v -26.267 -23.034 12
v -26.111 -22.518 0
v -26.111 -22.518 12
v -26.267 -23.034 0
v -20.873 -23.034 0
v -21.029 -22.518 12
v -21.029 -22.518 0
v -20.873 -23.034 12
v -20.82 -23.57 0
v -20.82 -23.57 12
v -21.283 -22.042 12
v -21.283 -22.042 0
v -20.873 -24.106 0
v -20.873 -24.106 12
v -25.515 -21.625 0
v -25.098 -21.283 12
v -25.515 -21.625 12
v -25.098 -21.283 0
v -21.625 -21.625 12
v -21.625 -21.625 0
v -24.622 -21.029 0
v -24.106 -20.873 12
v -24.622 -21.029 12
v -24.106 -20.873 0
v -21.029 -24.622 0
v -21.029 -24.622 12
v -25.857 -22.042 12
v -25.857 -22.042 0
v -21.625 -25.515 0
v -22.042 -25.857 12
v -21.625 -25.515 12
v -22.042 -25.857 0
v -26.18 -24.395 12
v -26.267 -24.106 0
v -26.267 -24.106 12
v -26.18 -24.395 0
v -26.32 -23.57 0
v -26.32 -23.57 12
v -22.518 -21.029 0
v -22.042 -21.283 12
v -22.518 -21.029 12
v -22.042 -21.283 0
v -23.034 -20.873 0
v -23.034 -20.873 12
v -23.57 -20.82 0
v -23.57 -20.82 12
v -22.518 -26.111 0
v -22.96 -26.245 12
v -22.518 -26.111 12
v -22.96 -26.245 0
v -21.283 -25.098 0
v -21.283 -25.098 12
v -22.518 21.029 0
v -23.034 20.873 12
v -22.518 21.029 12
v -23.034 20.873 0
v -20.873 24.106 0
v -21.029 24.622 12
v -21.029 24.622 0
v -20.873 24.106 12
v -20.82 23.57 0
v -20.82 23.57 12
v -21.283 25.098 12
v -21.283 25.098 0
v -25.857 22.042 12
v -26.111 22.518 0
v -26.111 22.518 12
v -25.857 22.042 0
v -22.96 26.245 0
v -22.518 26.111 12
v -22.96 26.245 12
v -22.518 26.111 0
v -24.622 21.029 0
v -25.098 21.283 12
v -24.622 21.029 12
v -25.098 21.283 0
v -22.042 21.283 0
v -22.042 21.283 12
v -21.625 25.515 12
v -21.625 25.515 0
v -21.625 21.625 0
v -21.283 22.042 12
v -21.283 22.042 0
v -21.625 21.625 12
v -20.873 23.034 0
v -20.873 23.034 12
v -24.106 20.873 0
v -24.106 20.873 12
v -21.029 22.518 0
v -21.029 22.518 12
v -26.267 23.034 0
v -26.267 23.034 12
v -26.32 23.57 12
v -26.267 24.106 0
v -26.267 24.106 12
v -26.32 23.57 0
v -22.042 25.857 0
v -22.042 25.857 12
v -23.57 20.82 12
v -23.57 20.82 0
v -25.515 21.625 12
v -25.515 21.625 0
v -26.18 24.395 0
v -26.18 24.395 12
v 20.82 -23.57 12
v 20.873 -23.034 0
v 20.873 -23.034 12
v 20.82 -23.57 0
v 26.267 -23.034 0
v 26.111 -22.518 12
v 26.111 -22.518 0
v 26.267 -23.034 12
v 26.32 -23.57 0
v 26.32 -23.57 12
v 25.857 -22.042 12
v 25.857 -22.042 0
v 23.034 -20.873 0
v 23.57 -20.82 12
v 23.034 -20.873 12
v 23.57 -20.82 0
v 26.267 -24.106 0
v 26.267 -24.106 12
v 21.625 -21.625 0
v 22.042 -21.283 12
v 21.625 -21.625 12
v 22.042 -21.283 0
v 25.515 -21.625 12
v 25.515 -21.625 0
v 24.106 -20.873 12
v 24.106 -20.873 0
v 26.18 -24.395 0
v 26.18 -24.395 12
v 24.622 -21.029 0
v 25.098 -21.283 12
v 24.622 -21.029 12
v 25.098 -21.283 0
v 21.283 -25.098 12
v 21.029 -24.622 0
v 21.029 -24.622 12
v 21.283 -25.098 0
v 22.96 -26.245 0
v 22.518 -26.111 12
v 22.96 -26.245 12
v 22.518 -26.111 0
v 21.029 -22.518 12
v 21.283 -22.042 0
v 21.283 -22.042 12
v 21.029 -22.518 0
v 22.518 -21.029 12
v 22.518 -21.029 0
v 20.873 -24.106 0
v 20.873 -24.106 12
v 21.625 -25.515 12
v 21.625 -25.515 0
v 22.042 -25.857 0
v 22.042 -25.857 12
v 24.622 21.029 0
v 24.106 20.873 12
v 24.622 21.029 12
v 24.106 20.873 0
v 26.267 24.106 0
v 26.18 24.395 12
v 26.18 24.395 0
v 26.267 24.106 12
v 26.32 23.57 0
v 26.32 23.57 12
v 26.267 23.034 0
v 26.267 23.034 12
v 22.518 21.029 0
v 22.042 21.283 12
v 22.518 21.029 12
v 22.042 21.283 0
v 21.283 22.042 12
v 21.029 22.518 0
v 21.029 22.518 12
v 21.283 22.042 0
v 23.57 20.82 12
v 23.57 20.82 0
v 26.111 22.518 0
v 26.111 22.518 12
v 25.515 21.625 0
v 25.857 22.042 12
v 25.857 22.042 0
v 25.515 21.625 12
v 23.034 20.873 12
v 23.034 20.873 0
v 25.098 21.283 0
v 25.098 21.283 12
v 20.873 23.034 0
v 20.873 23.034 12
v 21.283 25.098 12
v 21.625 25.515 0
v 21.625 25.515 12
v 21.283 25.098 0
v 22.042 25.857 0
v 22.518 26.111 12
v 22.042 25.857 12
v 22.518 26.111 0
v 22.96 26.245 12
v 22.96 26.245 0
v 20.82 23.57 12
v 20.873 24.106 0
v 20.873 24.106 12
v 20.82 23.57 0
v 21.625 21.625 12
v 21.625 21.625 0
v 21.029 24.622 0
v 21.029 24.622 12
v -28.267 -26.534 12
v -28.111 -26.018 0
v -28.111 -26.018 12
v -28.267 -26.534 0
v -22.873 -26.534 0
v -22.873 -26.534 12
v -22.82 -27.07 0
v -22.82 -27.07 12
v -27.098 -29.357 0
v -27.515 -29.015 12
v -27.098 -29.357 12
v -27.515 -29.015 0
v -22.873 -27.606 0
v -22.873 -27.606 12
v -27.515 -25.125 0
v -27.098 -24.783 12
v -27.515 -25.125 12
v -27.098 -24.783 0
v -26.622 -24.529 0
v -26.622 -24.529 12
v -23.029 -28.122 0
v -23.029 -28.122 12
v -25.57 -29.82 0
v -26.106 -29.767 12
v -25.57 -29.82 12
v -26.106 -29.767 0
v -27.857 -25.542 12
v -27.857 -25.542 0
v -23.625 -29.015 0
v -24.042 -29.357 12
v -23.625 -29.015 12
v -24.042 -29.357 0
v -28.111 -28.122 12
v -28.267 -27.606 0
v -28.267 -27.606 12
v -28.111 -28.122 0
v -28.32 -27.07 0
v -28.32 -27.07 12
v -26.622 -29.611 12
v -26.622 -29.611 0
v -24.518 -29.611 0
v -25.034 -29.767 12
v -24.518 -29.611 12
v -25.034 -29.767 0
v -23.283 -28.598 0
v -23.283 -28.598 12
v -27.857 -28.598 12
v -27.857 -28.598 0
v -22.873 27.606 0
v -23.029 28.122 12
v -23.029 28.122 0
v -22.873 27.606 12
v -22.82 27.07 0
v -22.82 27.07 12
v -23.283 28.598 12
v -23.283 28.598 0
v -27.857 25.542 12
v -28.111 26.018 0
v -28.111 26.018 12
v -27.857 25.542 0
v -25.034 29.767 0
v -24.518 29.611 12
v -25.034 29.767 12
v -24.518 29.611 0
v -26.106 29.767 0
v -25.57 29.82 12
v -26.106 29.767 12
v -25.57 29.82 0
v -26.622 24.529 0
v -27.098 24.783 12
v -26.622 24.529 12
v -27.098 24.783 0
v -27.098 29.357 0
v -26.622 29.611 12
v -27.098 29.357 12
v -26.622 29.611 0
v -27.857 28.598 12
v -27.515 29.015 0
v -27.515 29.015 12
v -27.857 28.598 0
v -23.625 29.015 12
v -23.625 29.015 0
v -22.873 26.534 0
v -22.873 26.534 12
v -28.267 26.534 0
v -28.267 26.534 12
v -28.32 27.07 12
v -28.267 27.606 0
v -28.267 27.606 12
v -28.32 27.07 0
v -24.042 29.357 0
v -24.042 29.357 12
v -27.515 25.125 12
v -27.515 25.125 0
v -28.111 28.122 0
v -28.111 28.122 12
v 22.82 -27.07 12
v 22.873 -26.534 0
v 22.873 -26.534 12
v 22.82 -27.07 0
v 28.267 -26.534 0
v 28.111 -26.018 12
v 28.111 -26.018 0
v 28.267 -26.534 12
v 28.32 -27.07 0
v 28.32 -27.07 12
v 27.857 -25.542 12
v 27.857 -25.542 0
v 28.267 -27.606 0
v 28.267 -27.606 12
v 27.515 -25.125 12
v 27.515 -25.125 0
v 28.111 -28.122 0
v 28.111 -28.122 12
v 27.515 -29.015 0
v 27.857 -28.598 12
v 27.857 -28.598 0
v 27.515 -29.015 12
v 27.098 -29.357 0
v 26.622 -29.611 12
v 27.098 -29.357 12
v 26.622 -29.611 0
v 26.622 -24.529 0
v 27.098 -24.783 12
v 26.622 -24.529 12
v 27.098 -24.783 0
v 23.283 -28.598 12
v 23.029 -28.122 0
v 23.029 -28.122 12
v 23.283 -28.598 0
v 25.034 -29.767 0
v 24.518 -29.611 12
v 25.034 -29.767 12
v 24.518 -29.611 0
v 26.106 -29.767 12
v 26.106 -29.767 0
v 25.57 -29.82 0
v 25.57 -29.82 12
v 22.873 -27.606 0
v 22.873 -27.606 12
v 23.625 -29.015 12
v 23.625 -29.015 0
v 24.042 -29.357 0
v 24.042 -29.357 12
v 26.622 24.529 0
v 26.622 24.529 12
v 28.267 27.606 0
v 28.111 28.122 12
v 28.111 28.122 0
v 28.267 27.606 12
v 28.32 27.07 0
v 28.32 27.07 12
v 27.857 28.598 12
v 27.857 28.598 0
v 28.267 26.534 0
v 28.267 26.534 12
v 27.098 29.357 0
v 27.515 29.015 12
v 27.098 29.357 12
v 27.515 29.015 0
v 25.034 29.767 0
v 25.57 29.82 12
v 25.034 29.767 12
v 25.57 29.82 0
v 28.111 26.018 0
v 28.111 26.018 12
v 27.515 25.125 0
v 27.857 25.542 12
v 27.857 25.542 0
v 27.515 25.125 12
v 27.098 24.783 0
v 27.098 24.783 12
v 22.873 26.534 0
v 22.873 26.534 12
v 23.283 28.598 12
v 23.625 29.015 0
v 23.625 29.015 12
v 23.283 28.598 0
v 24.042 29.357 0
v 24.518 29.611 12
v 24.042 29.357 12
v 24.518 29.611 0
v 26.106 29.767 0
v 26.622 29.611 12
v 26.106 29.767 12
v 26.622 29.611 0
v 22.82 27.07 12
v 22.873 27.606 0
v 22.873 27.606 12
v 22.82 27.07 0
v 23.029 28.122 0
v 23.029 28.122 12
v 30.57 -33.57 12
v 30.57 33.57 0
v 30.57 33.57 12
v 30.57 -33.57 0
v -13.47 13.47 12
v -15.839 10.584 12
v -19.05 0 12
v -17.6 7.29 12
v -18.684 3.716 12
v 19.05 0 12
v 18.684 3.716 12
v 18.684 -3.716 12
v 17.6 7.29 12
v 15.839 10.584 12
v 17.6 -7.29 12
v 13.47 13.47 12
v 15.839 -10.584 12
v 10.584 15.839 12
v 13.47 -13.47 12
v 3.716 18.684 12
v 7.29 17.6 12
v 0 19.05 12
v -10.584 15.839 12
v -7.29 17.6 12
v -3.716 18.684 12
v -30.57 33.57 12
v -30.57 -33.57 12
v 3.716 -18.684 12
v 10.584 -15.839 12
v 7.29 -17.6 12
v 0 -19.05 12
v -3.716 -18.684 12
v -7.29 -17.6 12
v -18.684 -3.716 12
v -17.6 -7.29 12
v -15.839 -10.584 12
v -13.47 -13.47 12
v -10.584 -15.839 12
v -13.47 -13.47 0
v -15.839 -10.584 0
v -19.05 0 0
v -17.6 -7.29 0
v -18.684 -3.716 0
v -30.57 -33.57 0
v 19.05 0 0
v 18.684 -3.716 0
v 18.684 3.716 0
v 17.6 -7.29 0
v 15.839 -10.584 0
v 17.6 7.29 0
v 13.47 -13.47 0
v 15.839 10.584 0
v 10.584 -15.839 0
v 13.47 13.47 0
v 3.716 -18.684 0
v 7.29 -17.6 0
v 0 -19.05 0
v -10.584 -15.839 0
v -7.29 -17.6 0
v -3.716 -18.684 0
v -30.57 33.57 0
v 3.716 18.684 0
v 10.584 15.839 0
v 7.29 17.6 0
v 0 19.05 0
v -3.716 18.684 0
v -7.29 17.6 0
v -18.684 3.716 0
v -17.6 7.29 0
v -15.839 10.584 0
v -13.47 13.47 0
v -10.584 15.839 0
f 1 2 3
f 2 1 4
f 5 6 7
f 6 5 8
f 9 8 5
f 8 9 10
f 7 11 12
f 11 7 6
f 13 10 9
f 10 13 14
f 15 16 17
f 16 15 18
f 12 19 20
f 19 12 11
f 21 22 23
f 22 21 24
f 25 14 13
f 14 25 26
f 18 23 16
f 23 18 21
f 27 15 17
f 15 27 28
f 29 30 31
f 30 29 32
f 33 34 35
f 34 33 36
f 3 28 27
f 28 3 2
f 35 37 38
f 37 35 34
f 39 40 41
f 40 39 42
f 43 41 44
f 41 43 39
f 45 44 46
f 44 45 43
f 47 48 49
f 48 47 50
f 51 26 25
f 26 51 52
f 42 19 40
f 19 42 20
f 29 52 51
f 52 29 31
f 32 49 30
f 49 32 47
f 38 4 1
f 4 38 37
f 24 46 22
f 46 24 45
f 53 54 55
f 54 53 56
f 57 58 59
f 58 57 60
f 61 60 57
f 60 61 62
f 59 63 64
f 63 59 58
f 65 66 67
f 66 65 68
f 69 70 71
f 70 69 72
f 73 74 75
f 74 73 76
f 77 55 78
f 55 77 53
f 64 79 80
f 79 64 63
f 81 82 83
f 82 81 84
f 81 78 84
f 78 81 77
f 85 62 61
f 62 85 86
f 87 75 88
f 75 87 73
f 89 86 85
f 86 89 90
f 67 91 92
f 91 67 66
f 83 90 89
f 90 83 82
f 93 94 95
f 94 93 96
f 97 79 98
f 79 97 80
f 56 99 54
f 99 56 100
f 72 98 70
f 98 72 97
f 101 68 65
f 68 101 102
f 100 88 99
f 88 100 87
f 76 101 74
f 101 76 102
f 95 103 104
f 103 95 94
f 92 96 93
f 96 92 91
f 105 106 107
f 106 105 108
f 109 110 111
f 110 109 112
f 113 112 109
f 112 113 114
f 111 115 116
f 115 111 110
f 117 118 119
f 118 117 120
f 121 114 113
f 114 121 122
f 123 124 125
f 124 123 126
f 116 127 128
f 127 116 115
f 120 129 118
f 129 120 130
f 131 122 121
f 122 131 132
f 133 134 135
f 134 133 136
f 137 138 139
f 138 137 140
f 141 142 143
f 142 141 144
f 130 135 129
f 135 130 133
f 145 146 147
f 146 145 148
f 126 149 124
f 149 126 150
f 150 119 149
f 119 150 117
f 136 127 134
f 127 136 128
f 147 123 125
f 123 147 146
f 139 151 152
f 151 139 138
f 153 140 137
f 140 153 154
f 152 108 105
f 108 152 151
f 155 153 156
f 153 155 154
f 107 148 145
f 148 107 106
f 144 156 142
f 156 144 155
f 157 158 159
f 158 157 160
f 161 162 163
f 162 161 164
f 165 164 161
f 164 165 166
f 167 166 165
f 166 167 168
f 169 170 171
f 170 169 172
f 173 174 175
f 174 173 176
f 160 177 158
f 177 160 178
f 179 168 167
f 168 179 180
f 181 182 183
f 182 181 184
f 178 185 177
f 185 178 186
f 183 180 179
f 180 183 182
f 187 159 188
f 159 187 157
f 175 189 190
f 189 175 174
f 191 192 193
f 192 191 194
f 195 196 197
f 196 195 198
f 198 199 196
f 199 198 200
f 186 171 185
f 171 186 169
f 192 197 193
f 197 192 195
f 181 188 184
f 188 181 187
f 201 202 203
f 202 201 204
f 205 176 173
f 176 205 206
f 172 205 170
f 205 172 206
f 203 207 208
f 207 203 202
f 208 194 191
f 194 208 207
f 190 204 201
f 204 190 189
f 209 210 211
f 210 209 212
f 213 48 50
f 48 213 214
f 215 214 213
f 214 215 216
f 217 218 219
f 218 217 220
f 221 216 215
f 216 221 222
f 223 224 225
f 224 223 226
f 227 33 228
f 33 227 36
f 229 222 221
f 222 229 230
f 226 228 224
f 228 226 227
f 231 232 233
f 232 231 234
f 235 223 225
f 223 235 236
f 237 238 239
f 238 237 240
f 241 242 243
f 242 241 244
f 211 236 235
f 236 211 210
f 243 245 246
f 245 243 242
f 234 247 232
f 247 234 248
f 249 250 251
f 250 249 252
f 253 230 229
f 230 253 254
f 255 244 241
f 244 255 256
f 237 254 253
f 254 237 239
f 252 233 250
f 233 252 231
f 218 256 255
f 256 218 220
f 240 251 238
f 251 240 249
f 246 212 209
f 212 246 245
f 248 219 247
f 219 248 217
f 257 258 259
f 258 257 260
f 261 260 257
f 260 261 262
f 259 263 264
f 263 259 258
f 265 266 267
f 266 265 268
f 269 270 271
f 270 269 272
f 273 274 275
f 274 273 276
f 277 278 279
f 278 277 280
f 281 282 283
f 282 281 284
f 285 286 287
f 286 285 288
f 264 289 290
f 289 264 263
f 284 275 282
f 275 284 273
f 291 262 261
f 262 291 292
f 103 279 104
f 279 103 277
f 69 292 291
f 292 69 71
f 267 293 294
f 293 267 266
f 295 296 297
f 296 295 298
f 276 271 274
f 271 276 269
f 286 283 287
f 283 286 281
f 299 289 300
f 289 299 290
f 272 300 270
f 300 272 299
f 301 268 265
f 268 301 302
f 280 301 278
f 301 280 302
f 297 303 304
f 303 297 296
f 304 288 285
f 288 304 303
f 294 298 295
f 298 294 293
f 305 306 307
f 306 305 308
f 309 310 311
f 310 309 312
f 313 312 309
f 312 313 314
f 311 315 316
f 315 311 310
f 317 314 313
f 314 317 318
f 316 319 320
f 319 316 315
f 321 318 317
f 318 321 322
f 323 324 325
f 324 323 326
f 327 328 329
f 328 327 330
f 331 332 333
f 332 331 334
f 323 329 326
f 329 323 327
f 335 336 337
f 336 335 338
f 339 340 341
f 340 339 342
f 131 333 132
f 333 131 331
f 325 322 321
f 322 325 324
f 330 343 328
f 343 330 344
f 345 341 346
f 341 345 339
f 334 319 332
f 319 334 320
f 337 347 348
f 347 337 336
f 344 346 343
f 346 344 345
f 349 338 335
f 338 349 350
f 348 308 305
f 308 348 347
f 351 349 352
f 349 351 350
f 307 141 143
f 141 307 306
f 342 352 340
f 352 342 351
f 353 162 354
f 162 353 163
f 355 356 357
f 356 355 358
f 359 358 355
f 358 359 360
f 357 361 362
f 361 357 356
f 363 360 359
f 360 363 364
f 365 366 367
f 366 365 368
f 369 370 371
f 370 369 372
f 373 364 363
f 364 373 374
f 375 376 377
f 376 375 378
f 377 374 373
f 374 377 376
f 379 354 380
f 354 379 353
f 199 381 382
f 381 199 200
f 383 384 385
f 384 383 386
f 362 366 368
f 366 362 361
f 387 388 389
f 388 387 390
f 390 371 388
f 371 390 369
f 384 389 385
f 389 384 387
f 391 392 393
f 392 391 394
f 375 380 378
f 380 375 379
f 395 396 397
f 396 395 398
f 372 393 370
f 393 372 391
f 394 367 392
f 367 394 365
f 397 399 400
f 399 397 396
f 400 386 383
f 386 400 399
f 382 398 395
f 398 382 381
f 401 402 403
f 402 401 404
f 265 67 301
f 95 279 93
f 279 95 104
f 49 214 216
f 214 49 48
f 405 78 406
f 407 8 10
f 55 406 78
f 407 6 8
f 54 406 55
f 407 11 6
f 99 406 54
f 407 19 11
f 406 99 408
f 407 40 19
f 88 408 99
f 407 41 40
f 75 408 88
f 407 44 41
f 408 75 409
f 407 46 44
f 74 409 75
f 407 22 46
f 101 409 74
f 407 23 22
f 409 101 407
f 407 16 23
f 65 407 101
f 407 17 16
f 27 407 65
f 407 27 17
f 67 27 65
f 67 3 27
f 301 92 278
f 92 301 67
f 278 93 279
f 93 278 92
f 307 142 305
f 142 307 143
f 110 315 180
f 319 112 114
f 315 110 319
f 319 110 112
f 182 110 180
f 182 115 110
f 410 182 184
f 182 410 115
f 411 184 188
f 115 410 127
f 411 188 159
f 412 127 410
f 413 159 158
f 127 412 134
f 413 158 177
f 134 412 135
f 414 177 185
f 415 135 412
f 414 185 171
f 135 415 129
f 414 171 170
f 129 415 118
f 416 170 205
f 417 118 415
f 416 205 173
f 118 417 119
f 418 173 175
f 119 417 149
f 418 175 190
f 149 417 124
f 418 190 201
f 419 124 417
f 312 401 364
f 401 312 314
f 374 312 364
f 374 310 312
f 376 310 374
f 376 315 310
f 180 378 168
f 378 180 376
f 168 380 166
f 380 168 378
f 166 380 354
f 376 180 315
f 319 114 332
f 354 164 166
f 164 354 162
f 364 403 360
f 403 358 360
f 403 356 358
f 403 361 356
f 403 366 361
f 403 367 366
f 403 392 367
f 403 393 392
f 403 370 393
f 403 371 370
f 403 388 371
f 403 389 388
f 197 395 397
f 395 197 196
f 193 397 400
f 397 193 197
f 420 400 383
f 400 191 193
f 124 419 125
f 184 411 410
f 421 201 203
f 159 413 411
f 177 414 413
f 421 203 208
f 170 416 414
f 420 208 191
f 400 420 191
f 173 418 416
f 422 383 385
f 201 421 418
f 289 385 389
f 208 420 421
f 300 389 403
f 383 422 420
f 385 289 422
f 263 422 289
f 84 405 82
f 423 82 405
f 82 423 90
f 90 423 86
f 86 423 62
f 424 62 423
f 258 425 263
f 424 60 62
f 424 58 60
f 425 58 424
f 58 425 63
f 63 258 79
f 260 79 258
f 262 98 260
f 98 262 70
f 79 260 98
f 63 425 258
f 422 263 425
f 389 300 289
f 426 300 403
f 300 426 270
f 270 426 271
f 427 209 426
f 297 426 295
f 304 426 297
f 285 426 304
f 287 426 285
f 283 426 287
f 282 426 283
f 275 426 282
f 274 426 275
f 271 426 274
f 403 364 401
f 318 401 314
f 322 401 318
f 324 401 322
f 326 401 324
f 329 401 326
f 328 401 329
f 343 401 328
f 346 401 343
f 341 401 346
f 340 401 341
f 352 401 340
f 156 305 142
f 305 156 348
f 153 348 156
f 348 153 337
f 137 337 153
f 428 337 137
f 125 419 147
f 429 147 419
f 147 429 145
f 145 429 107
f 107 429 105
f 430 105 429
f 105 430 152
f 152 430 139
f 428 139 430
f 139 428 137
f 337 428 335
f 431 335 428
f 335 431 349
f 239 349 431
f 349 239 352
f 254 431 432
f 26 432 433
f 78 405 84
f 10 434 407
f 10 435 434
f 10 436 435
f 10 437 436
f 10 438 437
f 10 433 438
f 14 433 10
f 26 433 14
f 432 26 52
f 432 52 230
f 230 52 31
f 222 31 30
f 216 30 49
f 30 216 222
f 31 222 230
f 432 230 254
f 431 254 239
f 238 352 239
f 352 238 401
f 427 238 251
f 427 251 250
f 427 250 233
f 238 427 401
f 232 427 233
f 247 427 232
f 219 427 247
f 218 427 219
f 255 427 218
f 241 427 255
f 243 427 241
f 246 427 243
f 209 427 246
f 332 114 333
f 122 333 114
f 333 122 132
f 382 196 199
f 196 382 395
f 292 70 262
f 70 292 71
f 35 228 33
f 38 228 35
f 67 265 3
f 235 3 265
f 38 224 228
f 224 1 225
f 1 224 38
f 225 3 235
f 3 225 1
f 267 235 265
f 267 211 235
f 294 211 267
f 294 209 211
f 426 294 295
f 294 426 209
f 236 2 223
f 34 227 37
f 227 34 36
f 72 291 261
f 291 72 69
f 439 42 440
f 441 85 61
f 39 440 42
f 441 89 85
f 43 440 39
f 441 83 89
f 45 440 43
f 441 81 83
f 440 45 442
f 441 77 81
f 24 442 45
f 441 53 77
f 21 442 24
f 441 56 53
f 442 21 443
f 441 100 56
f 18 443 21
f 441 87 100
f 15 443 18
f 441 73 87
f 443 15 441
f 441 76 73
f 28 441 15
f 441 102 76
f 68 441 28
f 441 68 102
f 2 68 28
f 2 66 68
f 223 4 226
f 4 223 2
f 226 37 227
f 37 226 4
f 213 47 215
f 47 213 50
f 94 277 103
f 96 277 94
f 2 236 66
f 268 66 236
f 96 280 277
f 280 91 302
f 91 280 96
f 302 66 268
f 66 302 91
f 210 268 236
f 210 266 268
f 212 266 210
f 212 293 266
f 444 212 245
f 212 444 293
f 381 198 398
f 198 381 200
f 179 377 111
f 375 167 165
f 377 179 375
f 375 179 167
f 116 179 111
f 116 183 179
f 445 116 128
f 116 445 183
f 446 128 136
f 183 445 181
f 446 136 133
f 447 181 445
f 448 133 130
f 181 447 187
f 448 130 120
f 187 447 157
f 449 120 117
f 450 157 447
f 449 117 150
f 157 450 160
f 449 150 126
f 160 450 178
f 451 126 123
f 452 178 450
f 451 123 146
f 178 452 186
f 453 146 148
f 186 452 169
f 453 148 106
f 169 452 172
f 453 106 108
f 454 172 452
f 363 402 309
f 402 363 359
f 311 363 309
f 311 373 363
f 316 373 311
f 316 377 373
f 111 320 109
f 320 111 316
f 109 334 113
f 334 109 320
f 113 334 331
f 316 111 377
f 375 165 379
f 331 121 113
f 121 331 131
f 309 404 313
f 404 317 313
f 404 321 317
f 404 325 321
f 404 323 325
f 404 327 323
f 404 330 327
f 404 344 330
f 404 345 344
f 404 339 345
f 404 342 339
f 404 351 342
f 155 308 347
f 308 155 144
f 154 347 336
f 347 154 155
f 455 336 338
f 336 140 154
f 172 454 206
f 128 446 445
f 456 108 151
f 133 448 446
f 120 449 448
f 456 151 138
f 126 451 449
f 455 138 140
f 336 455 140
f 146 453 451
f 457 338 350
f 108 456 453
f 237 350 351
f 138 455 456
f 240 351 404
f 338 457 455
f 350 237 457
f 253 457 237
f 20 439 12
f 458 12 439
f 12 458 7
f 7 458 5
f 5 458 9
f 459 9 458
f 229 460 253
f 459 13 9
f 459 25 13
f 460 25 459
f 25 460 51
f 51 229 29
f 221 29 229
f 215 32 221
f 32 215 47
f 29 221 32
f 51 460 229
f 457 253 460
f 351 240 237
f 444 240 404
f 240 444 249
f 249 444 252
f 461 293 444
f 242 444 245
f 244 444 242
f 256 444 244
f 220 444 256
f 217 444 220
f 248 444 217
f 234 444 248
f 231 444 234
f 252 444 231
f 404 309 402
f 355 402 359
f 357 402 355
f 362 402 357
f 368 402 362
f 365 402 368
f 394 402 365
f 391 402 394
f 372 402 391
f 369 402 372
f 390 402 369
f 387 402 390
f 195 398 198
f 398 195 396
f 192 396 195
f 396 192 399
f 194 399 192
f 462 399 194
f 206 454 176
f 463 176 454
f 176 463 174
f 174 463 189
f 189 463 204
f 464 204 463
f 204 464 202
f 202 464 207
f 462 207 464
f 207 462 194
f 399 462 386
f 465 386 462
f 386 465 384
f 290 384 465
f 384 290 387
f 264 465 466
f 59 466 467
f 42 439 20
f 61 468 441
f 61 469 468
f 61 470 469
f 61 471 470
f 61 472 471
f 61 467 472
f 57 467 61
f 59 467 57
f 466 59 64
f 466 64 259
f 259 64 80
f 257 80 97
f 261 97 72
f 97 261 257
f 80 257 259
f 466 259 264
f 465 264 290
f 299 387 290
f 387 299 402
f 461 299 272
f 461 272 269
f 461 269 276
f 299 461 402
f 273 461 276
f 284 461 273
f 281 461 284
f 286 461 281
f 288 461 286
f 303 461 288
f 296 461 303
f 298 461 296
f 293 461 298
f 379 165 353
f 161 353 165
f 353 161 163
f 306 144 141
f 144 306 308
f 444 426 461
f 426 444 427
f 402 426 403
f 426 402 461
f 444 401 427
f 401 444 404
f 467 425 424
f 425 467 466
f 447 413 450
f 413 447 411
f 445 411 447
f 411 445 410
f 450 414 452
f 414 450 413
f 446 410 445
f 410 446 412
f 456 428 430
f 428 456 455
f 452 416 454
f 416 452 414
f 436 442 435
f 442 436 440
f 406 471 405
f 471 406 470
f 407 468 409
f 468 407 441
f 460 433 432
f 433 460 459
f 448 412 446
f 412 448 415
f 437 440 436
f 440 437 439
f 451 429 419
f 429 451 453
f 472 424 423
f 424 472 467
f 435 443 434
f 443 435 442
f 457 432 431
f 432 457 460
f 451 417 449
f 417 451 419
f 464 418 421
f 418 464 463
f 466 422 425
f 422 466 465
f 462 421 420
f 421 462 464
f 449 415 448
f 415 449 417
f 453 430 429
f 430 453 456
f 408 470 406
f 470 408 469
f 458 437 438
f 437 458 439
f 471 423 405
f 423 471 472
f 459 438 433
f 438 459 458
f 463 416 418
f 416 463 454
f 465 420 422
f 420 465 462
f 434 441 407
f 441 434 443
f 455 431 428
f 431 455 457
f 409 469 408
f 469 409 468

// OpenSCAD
$fn = 32;

// ----------------------------------------------------------------------
// Motor mount plate: NEMA23, 61.14 x 67.14 x 12 mm
// ----------------------------------------------------------------------

// --- parameters (mm) ---
mount_w = 61.14;          // plate length, X
mount_d = 67.14;          // plate width, Y
mat_t = 12;               // plate thickness
motor_pitch = 47.14;      // NEMA23 bolt spacing
motor_d = 5.5;            // NEMA23 screw clearance
center_bore = 38.1;       // pilot boss bore
second_d = 5.5;           // second fastener hole

module plate() {
  translate([-mount_w / 2, -mount_d / 2, 0]) cube([mount_w, mount_d, mat_t]);
}

module motor_holes() {
  for (sx = [-1, 1]) for (sy = [-1, 1])
    translate([sx * motor_pitch / 2, sy * motor_pitch / 2, -1])
      cylinder(h = mat_t + 2, d = motor_d);
}

difference() {
  union() {
    plate();
  }
  motor_holes();
  translate([0, 0, -1]) cylinder(h = mat_t + 2, d = center_bore);
  for (sx = [-1, 1]) for (sy = [-1, 1])
    translate([sx * 25.57, sy * 27.07, -1]) cylinder(h = mat_t + 2, d = second_d);
}
